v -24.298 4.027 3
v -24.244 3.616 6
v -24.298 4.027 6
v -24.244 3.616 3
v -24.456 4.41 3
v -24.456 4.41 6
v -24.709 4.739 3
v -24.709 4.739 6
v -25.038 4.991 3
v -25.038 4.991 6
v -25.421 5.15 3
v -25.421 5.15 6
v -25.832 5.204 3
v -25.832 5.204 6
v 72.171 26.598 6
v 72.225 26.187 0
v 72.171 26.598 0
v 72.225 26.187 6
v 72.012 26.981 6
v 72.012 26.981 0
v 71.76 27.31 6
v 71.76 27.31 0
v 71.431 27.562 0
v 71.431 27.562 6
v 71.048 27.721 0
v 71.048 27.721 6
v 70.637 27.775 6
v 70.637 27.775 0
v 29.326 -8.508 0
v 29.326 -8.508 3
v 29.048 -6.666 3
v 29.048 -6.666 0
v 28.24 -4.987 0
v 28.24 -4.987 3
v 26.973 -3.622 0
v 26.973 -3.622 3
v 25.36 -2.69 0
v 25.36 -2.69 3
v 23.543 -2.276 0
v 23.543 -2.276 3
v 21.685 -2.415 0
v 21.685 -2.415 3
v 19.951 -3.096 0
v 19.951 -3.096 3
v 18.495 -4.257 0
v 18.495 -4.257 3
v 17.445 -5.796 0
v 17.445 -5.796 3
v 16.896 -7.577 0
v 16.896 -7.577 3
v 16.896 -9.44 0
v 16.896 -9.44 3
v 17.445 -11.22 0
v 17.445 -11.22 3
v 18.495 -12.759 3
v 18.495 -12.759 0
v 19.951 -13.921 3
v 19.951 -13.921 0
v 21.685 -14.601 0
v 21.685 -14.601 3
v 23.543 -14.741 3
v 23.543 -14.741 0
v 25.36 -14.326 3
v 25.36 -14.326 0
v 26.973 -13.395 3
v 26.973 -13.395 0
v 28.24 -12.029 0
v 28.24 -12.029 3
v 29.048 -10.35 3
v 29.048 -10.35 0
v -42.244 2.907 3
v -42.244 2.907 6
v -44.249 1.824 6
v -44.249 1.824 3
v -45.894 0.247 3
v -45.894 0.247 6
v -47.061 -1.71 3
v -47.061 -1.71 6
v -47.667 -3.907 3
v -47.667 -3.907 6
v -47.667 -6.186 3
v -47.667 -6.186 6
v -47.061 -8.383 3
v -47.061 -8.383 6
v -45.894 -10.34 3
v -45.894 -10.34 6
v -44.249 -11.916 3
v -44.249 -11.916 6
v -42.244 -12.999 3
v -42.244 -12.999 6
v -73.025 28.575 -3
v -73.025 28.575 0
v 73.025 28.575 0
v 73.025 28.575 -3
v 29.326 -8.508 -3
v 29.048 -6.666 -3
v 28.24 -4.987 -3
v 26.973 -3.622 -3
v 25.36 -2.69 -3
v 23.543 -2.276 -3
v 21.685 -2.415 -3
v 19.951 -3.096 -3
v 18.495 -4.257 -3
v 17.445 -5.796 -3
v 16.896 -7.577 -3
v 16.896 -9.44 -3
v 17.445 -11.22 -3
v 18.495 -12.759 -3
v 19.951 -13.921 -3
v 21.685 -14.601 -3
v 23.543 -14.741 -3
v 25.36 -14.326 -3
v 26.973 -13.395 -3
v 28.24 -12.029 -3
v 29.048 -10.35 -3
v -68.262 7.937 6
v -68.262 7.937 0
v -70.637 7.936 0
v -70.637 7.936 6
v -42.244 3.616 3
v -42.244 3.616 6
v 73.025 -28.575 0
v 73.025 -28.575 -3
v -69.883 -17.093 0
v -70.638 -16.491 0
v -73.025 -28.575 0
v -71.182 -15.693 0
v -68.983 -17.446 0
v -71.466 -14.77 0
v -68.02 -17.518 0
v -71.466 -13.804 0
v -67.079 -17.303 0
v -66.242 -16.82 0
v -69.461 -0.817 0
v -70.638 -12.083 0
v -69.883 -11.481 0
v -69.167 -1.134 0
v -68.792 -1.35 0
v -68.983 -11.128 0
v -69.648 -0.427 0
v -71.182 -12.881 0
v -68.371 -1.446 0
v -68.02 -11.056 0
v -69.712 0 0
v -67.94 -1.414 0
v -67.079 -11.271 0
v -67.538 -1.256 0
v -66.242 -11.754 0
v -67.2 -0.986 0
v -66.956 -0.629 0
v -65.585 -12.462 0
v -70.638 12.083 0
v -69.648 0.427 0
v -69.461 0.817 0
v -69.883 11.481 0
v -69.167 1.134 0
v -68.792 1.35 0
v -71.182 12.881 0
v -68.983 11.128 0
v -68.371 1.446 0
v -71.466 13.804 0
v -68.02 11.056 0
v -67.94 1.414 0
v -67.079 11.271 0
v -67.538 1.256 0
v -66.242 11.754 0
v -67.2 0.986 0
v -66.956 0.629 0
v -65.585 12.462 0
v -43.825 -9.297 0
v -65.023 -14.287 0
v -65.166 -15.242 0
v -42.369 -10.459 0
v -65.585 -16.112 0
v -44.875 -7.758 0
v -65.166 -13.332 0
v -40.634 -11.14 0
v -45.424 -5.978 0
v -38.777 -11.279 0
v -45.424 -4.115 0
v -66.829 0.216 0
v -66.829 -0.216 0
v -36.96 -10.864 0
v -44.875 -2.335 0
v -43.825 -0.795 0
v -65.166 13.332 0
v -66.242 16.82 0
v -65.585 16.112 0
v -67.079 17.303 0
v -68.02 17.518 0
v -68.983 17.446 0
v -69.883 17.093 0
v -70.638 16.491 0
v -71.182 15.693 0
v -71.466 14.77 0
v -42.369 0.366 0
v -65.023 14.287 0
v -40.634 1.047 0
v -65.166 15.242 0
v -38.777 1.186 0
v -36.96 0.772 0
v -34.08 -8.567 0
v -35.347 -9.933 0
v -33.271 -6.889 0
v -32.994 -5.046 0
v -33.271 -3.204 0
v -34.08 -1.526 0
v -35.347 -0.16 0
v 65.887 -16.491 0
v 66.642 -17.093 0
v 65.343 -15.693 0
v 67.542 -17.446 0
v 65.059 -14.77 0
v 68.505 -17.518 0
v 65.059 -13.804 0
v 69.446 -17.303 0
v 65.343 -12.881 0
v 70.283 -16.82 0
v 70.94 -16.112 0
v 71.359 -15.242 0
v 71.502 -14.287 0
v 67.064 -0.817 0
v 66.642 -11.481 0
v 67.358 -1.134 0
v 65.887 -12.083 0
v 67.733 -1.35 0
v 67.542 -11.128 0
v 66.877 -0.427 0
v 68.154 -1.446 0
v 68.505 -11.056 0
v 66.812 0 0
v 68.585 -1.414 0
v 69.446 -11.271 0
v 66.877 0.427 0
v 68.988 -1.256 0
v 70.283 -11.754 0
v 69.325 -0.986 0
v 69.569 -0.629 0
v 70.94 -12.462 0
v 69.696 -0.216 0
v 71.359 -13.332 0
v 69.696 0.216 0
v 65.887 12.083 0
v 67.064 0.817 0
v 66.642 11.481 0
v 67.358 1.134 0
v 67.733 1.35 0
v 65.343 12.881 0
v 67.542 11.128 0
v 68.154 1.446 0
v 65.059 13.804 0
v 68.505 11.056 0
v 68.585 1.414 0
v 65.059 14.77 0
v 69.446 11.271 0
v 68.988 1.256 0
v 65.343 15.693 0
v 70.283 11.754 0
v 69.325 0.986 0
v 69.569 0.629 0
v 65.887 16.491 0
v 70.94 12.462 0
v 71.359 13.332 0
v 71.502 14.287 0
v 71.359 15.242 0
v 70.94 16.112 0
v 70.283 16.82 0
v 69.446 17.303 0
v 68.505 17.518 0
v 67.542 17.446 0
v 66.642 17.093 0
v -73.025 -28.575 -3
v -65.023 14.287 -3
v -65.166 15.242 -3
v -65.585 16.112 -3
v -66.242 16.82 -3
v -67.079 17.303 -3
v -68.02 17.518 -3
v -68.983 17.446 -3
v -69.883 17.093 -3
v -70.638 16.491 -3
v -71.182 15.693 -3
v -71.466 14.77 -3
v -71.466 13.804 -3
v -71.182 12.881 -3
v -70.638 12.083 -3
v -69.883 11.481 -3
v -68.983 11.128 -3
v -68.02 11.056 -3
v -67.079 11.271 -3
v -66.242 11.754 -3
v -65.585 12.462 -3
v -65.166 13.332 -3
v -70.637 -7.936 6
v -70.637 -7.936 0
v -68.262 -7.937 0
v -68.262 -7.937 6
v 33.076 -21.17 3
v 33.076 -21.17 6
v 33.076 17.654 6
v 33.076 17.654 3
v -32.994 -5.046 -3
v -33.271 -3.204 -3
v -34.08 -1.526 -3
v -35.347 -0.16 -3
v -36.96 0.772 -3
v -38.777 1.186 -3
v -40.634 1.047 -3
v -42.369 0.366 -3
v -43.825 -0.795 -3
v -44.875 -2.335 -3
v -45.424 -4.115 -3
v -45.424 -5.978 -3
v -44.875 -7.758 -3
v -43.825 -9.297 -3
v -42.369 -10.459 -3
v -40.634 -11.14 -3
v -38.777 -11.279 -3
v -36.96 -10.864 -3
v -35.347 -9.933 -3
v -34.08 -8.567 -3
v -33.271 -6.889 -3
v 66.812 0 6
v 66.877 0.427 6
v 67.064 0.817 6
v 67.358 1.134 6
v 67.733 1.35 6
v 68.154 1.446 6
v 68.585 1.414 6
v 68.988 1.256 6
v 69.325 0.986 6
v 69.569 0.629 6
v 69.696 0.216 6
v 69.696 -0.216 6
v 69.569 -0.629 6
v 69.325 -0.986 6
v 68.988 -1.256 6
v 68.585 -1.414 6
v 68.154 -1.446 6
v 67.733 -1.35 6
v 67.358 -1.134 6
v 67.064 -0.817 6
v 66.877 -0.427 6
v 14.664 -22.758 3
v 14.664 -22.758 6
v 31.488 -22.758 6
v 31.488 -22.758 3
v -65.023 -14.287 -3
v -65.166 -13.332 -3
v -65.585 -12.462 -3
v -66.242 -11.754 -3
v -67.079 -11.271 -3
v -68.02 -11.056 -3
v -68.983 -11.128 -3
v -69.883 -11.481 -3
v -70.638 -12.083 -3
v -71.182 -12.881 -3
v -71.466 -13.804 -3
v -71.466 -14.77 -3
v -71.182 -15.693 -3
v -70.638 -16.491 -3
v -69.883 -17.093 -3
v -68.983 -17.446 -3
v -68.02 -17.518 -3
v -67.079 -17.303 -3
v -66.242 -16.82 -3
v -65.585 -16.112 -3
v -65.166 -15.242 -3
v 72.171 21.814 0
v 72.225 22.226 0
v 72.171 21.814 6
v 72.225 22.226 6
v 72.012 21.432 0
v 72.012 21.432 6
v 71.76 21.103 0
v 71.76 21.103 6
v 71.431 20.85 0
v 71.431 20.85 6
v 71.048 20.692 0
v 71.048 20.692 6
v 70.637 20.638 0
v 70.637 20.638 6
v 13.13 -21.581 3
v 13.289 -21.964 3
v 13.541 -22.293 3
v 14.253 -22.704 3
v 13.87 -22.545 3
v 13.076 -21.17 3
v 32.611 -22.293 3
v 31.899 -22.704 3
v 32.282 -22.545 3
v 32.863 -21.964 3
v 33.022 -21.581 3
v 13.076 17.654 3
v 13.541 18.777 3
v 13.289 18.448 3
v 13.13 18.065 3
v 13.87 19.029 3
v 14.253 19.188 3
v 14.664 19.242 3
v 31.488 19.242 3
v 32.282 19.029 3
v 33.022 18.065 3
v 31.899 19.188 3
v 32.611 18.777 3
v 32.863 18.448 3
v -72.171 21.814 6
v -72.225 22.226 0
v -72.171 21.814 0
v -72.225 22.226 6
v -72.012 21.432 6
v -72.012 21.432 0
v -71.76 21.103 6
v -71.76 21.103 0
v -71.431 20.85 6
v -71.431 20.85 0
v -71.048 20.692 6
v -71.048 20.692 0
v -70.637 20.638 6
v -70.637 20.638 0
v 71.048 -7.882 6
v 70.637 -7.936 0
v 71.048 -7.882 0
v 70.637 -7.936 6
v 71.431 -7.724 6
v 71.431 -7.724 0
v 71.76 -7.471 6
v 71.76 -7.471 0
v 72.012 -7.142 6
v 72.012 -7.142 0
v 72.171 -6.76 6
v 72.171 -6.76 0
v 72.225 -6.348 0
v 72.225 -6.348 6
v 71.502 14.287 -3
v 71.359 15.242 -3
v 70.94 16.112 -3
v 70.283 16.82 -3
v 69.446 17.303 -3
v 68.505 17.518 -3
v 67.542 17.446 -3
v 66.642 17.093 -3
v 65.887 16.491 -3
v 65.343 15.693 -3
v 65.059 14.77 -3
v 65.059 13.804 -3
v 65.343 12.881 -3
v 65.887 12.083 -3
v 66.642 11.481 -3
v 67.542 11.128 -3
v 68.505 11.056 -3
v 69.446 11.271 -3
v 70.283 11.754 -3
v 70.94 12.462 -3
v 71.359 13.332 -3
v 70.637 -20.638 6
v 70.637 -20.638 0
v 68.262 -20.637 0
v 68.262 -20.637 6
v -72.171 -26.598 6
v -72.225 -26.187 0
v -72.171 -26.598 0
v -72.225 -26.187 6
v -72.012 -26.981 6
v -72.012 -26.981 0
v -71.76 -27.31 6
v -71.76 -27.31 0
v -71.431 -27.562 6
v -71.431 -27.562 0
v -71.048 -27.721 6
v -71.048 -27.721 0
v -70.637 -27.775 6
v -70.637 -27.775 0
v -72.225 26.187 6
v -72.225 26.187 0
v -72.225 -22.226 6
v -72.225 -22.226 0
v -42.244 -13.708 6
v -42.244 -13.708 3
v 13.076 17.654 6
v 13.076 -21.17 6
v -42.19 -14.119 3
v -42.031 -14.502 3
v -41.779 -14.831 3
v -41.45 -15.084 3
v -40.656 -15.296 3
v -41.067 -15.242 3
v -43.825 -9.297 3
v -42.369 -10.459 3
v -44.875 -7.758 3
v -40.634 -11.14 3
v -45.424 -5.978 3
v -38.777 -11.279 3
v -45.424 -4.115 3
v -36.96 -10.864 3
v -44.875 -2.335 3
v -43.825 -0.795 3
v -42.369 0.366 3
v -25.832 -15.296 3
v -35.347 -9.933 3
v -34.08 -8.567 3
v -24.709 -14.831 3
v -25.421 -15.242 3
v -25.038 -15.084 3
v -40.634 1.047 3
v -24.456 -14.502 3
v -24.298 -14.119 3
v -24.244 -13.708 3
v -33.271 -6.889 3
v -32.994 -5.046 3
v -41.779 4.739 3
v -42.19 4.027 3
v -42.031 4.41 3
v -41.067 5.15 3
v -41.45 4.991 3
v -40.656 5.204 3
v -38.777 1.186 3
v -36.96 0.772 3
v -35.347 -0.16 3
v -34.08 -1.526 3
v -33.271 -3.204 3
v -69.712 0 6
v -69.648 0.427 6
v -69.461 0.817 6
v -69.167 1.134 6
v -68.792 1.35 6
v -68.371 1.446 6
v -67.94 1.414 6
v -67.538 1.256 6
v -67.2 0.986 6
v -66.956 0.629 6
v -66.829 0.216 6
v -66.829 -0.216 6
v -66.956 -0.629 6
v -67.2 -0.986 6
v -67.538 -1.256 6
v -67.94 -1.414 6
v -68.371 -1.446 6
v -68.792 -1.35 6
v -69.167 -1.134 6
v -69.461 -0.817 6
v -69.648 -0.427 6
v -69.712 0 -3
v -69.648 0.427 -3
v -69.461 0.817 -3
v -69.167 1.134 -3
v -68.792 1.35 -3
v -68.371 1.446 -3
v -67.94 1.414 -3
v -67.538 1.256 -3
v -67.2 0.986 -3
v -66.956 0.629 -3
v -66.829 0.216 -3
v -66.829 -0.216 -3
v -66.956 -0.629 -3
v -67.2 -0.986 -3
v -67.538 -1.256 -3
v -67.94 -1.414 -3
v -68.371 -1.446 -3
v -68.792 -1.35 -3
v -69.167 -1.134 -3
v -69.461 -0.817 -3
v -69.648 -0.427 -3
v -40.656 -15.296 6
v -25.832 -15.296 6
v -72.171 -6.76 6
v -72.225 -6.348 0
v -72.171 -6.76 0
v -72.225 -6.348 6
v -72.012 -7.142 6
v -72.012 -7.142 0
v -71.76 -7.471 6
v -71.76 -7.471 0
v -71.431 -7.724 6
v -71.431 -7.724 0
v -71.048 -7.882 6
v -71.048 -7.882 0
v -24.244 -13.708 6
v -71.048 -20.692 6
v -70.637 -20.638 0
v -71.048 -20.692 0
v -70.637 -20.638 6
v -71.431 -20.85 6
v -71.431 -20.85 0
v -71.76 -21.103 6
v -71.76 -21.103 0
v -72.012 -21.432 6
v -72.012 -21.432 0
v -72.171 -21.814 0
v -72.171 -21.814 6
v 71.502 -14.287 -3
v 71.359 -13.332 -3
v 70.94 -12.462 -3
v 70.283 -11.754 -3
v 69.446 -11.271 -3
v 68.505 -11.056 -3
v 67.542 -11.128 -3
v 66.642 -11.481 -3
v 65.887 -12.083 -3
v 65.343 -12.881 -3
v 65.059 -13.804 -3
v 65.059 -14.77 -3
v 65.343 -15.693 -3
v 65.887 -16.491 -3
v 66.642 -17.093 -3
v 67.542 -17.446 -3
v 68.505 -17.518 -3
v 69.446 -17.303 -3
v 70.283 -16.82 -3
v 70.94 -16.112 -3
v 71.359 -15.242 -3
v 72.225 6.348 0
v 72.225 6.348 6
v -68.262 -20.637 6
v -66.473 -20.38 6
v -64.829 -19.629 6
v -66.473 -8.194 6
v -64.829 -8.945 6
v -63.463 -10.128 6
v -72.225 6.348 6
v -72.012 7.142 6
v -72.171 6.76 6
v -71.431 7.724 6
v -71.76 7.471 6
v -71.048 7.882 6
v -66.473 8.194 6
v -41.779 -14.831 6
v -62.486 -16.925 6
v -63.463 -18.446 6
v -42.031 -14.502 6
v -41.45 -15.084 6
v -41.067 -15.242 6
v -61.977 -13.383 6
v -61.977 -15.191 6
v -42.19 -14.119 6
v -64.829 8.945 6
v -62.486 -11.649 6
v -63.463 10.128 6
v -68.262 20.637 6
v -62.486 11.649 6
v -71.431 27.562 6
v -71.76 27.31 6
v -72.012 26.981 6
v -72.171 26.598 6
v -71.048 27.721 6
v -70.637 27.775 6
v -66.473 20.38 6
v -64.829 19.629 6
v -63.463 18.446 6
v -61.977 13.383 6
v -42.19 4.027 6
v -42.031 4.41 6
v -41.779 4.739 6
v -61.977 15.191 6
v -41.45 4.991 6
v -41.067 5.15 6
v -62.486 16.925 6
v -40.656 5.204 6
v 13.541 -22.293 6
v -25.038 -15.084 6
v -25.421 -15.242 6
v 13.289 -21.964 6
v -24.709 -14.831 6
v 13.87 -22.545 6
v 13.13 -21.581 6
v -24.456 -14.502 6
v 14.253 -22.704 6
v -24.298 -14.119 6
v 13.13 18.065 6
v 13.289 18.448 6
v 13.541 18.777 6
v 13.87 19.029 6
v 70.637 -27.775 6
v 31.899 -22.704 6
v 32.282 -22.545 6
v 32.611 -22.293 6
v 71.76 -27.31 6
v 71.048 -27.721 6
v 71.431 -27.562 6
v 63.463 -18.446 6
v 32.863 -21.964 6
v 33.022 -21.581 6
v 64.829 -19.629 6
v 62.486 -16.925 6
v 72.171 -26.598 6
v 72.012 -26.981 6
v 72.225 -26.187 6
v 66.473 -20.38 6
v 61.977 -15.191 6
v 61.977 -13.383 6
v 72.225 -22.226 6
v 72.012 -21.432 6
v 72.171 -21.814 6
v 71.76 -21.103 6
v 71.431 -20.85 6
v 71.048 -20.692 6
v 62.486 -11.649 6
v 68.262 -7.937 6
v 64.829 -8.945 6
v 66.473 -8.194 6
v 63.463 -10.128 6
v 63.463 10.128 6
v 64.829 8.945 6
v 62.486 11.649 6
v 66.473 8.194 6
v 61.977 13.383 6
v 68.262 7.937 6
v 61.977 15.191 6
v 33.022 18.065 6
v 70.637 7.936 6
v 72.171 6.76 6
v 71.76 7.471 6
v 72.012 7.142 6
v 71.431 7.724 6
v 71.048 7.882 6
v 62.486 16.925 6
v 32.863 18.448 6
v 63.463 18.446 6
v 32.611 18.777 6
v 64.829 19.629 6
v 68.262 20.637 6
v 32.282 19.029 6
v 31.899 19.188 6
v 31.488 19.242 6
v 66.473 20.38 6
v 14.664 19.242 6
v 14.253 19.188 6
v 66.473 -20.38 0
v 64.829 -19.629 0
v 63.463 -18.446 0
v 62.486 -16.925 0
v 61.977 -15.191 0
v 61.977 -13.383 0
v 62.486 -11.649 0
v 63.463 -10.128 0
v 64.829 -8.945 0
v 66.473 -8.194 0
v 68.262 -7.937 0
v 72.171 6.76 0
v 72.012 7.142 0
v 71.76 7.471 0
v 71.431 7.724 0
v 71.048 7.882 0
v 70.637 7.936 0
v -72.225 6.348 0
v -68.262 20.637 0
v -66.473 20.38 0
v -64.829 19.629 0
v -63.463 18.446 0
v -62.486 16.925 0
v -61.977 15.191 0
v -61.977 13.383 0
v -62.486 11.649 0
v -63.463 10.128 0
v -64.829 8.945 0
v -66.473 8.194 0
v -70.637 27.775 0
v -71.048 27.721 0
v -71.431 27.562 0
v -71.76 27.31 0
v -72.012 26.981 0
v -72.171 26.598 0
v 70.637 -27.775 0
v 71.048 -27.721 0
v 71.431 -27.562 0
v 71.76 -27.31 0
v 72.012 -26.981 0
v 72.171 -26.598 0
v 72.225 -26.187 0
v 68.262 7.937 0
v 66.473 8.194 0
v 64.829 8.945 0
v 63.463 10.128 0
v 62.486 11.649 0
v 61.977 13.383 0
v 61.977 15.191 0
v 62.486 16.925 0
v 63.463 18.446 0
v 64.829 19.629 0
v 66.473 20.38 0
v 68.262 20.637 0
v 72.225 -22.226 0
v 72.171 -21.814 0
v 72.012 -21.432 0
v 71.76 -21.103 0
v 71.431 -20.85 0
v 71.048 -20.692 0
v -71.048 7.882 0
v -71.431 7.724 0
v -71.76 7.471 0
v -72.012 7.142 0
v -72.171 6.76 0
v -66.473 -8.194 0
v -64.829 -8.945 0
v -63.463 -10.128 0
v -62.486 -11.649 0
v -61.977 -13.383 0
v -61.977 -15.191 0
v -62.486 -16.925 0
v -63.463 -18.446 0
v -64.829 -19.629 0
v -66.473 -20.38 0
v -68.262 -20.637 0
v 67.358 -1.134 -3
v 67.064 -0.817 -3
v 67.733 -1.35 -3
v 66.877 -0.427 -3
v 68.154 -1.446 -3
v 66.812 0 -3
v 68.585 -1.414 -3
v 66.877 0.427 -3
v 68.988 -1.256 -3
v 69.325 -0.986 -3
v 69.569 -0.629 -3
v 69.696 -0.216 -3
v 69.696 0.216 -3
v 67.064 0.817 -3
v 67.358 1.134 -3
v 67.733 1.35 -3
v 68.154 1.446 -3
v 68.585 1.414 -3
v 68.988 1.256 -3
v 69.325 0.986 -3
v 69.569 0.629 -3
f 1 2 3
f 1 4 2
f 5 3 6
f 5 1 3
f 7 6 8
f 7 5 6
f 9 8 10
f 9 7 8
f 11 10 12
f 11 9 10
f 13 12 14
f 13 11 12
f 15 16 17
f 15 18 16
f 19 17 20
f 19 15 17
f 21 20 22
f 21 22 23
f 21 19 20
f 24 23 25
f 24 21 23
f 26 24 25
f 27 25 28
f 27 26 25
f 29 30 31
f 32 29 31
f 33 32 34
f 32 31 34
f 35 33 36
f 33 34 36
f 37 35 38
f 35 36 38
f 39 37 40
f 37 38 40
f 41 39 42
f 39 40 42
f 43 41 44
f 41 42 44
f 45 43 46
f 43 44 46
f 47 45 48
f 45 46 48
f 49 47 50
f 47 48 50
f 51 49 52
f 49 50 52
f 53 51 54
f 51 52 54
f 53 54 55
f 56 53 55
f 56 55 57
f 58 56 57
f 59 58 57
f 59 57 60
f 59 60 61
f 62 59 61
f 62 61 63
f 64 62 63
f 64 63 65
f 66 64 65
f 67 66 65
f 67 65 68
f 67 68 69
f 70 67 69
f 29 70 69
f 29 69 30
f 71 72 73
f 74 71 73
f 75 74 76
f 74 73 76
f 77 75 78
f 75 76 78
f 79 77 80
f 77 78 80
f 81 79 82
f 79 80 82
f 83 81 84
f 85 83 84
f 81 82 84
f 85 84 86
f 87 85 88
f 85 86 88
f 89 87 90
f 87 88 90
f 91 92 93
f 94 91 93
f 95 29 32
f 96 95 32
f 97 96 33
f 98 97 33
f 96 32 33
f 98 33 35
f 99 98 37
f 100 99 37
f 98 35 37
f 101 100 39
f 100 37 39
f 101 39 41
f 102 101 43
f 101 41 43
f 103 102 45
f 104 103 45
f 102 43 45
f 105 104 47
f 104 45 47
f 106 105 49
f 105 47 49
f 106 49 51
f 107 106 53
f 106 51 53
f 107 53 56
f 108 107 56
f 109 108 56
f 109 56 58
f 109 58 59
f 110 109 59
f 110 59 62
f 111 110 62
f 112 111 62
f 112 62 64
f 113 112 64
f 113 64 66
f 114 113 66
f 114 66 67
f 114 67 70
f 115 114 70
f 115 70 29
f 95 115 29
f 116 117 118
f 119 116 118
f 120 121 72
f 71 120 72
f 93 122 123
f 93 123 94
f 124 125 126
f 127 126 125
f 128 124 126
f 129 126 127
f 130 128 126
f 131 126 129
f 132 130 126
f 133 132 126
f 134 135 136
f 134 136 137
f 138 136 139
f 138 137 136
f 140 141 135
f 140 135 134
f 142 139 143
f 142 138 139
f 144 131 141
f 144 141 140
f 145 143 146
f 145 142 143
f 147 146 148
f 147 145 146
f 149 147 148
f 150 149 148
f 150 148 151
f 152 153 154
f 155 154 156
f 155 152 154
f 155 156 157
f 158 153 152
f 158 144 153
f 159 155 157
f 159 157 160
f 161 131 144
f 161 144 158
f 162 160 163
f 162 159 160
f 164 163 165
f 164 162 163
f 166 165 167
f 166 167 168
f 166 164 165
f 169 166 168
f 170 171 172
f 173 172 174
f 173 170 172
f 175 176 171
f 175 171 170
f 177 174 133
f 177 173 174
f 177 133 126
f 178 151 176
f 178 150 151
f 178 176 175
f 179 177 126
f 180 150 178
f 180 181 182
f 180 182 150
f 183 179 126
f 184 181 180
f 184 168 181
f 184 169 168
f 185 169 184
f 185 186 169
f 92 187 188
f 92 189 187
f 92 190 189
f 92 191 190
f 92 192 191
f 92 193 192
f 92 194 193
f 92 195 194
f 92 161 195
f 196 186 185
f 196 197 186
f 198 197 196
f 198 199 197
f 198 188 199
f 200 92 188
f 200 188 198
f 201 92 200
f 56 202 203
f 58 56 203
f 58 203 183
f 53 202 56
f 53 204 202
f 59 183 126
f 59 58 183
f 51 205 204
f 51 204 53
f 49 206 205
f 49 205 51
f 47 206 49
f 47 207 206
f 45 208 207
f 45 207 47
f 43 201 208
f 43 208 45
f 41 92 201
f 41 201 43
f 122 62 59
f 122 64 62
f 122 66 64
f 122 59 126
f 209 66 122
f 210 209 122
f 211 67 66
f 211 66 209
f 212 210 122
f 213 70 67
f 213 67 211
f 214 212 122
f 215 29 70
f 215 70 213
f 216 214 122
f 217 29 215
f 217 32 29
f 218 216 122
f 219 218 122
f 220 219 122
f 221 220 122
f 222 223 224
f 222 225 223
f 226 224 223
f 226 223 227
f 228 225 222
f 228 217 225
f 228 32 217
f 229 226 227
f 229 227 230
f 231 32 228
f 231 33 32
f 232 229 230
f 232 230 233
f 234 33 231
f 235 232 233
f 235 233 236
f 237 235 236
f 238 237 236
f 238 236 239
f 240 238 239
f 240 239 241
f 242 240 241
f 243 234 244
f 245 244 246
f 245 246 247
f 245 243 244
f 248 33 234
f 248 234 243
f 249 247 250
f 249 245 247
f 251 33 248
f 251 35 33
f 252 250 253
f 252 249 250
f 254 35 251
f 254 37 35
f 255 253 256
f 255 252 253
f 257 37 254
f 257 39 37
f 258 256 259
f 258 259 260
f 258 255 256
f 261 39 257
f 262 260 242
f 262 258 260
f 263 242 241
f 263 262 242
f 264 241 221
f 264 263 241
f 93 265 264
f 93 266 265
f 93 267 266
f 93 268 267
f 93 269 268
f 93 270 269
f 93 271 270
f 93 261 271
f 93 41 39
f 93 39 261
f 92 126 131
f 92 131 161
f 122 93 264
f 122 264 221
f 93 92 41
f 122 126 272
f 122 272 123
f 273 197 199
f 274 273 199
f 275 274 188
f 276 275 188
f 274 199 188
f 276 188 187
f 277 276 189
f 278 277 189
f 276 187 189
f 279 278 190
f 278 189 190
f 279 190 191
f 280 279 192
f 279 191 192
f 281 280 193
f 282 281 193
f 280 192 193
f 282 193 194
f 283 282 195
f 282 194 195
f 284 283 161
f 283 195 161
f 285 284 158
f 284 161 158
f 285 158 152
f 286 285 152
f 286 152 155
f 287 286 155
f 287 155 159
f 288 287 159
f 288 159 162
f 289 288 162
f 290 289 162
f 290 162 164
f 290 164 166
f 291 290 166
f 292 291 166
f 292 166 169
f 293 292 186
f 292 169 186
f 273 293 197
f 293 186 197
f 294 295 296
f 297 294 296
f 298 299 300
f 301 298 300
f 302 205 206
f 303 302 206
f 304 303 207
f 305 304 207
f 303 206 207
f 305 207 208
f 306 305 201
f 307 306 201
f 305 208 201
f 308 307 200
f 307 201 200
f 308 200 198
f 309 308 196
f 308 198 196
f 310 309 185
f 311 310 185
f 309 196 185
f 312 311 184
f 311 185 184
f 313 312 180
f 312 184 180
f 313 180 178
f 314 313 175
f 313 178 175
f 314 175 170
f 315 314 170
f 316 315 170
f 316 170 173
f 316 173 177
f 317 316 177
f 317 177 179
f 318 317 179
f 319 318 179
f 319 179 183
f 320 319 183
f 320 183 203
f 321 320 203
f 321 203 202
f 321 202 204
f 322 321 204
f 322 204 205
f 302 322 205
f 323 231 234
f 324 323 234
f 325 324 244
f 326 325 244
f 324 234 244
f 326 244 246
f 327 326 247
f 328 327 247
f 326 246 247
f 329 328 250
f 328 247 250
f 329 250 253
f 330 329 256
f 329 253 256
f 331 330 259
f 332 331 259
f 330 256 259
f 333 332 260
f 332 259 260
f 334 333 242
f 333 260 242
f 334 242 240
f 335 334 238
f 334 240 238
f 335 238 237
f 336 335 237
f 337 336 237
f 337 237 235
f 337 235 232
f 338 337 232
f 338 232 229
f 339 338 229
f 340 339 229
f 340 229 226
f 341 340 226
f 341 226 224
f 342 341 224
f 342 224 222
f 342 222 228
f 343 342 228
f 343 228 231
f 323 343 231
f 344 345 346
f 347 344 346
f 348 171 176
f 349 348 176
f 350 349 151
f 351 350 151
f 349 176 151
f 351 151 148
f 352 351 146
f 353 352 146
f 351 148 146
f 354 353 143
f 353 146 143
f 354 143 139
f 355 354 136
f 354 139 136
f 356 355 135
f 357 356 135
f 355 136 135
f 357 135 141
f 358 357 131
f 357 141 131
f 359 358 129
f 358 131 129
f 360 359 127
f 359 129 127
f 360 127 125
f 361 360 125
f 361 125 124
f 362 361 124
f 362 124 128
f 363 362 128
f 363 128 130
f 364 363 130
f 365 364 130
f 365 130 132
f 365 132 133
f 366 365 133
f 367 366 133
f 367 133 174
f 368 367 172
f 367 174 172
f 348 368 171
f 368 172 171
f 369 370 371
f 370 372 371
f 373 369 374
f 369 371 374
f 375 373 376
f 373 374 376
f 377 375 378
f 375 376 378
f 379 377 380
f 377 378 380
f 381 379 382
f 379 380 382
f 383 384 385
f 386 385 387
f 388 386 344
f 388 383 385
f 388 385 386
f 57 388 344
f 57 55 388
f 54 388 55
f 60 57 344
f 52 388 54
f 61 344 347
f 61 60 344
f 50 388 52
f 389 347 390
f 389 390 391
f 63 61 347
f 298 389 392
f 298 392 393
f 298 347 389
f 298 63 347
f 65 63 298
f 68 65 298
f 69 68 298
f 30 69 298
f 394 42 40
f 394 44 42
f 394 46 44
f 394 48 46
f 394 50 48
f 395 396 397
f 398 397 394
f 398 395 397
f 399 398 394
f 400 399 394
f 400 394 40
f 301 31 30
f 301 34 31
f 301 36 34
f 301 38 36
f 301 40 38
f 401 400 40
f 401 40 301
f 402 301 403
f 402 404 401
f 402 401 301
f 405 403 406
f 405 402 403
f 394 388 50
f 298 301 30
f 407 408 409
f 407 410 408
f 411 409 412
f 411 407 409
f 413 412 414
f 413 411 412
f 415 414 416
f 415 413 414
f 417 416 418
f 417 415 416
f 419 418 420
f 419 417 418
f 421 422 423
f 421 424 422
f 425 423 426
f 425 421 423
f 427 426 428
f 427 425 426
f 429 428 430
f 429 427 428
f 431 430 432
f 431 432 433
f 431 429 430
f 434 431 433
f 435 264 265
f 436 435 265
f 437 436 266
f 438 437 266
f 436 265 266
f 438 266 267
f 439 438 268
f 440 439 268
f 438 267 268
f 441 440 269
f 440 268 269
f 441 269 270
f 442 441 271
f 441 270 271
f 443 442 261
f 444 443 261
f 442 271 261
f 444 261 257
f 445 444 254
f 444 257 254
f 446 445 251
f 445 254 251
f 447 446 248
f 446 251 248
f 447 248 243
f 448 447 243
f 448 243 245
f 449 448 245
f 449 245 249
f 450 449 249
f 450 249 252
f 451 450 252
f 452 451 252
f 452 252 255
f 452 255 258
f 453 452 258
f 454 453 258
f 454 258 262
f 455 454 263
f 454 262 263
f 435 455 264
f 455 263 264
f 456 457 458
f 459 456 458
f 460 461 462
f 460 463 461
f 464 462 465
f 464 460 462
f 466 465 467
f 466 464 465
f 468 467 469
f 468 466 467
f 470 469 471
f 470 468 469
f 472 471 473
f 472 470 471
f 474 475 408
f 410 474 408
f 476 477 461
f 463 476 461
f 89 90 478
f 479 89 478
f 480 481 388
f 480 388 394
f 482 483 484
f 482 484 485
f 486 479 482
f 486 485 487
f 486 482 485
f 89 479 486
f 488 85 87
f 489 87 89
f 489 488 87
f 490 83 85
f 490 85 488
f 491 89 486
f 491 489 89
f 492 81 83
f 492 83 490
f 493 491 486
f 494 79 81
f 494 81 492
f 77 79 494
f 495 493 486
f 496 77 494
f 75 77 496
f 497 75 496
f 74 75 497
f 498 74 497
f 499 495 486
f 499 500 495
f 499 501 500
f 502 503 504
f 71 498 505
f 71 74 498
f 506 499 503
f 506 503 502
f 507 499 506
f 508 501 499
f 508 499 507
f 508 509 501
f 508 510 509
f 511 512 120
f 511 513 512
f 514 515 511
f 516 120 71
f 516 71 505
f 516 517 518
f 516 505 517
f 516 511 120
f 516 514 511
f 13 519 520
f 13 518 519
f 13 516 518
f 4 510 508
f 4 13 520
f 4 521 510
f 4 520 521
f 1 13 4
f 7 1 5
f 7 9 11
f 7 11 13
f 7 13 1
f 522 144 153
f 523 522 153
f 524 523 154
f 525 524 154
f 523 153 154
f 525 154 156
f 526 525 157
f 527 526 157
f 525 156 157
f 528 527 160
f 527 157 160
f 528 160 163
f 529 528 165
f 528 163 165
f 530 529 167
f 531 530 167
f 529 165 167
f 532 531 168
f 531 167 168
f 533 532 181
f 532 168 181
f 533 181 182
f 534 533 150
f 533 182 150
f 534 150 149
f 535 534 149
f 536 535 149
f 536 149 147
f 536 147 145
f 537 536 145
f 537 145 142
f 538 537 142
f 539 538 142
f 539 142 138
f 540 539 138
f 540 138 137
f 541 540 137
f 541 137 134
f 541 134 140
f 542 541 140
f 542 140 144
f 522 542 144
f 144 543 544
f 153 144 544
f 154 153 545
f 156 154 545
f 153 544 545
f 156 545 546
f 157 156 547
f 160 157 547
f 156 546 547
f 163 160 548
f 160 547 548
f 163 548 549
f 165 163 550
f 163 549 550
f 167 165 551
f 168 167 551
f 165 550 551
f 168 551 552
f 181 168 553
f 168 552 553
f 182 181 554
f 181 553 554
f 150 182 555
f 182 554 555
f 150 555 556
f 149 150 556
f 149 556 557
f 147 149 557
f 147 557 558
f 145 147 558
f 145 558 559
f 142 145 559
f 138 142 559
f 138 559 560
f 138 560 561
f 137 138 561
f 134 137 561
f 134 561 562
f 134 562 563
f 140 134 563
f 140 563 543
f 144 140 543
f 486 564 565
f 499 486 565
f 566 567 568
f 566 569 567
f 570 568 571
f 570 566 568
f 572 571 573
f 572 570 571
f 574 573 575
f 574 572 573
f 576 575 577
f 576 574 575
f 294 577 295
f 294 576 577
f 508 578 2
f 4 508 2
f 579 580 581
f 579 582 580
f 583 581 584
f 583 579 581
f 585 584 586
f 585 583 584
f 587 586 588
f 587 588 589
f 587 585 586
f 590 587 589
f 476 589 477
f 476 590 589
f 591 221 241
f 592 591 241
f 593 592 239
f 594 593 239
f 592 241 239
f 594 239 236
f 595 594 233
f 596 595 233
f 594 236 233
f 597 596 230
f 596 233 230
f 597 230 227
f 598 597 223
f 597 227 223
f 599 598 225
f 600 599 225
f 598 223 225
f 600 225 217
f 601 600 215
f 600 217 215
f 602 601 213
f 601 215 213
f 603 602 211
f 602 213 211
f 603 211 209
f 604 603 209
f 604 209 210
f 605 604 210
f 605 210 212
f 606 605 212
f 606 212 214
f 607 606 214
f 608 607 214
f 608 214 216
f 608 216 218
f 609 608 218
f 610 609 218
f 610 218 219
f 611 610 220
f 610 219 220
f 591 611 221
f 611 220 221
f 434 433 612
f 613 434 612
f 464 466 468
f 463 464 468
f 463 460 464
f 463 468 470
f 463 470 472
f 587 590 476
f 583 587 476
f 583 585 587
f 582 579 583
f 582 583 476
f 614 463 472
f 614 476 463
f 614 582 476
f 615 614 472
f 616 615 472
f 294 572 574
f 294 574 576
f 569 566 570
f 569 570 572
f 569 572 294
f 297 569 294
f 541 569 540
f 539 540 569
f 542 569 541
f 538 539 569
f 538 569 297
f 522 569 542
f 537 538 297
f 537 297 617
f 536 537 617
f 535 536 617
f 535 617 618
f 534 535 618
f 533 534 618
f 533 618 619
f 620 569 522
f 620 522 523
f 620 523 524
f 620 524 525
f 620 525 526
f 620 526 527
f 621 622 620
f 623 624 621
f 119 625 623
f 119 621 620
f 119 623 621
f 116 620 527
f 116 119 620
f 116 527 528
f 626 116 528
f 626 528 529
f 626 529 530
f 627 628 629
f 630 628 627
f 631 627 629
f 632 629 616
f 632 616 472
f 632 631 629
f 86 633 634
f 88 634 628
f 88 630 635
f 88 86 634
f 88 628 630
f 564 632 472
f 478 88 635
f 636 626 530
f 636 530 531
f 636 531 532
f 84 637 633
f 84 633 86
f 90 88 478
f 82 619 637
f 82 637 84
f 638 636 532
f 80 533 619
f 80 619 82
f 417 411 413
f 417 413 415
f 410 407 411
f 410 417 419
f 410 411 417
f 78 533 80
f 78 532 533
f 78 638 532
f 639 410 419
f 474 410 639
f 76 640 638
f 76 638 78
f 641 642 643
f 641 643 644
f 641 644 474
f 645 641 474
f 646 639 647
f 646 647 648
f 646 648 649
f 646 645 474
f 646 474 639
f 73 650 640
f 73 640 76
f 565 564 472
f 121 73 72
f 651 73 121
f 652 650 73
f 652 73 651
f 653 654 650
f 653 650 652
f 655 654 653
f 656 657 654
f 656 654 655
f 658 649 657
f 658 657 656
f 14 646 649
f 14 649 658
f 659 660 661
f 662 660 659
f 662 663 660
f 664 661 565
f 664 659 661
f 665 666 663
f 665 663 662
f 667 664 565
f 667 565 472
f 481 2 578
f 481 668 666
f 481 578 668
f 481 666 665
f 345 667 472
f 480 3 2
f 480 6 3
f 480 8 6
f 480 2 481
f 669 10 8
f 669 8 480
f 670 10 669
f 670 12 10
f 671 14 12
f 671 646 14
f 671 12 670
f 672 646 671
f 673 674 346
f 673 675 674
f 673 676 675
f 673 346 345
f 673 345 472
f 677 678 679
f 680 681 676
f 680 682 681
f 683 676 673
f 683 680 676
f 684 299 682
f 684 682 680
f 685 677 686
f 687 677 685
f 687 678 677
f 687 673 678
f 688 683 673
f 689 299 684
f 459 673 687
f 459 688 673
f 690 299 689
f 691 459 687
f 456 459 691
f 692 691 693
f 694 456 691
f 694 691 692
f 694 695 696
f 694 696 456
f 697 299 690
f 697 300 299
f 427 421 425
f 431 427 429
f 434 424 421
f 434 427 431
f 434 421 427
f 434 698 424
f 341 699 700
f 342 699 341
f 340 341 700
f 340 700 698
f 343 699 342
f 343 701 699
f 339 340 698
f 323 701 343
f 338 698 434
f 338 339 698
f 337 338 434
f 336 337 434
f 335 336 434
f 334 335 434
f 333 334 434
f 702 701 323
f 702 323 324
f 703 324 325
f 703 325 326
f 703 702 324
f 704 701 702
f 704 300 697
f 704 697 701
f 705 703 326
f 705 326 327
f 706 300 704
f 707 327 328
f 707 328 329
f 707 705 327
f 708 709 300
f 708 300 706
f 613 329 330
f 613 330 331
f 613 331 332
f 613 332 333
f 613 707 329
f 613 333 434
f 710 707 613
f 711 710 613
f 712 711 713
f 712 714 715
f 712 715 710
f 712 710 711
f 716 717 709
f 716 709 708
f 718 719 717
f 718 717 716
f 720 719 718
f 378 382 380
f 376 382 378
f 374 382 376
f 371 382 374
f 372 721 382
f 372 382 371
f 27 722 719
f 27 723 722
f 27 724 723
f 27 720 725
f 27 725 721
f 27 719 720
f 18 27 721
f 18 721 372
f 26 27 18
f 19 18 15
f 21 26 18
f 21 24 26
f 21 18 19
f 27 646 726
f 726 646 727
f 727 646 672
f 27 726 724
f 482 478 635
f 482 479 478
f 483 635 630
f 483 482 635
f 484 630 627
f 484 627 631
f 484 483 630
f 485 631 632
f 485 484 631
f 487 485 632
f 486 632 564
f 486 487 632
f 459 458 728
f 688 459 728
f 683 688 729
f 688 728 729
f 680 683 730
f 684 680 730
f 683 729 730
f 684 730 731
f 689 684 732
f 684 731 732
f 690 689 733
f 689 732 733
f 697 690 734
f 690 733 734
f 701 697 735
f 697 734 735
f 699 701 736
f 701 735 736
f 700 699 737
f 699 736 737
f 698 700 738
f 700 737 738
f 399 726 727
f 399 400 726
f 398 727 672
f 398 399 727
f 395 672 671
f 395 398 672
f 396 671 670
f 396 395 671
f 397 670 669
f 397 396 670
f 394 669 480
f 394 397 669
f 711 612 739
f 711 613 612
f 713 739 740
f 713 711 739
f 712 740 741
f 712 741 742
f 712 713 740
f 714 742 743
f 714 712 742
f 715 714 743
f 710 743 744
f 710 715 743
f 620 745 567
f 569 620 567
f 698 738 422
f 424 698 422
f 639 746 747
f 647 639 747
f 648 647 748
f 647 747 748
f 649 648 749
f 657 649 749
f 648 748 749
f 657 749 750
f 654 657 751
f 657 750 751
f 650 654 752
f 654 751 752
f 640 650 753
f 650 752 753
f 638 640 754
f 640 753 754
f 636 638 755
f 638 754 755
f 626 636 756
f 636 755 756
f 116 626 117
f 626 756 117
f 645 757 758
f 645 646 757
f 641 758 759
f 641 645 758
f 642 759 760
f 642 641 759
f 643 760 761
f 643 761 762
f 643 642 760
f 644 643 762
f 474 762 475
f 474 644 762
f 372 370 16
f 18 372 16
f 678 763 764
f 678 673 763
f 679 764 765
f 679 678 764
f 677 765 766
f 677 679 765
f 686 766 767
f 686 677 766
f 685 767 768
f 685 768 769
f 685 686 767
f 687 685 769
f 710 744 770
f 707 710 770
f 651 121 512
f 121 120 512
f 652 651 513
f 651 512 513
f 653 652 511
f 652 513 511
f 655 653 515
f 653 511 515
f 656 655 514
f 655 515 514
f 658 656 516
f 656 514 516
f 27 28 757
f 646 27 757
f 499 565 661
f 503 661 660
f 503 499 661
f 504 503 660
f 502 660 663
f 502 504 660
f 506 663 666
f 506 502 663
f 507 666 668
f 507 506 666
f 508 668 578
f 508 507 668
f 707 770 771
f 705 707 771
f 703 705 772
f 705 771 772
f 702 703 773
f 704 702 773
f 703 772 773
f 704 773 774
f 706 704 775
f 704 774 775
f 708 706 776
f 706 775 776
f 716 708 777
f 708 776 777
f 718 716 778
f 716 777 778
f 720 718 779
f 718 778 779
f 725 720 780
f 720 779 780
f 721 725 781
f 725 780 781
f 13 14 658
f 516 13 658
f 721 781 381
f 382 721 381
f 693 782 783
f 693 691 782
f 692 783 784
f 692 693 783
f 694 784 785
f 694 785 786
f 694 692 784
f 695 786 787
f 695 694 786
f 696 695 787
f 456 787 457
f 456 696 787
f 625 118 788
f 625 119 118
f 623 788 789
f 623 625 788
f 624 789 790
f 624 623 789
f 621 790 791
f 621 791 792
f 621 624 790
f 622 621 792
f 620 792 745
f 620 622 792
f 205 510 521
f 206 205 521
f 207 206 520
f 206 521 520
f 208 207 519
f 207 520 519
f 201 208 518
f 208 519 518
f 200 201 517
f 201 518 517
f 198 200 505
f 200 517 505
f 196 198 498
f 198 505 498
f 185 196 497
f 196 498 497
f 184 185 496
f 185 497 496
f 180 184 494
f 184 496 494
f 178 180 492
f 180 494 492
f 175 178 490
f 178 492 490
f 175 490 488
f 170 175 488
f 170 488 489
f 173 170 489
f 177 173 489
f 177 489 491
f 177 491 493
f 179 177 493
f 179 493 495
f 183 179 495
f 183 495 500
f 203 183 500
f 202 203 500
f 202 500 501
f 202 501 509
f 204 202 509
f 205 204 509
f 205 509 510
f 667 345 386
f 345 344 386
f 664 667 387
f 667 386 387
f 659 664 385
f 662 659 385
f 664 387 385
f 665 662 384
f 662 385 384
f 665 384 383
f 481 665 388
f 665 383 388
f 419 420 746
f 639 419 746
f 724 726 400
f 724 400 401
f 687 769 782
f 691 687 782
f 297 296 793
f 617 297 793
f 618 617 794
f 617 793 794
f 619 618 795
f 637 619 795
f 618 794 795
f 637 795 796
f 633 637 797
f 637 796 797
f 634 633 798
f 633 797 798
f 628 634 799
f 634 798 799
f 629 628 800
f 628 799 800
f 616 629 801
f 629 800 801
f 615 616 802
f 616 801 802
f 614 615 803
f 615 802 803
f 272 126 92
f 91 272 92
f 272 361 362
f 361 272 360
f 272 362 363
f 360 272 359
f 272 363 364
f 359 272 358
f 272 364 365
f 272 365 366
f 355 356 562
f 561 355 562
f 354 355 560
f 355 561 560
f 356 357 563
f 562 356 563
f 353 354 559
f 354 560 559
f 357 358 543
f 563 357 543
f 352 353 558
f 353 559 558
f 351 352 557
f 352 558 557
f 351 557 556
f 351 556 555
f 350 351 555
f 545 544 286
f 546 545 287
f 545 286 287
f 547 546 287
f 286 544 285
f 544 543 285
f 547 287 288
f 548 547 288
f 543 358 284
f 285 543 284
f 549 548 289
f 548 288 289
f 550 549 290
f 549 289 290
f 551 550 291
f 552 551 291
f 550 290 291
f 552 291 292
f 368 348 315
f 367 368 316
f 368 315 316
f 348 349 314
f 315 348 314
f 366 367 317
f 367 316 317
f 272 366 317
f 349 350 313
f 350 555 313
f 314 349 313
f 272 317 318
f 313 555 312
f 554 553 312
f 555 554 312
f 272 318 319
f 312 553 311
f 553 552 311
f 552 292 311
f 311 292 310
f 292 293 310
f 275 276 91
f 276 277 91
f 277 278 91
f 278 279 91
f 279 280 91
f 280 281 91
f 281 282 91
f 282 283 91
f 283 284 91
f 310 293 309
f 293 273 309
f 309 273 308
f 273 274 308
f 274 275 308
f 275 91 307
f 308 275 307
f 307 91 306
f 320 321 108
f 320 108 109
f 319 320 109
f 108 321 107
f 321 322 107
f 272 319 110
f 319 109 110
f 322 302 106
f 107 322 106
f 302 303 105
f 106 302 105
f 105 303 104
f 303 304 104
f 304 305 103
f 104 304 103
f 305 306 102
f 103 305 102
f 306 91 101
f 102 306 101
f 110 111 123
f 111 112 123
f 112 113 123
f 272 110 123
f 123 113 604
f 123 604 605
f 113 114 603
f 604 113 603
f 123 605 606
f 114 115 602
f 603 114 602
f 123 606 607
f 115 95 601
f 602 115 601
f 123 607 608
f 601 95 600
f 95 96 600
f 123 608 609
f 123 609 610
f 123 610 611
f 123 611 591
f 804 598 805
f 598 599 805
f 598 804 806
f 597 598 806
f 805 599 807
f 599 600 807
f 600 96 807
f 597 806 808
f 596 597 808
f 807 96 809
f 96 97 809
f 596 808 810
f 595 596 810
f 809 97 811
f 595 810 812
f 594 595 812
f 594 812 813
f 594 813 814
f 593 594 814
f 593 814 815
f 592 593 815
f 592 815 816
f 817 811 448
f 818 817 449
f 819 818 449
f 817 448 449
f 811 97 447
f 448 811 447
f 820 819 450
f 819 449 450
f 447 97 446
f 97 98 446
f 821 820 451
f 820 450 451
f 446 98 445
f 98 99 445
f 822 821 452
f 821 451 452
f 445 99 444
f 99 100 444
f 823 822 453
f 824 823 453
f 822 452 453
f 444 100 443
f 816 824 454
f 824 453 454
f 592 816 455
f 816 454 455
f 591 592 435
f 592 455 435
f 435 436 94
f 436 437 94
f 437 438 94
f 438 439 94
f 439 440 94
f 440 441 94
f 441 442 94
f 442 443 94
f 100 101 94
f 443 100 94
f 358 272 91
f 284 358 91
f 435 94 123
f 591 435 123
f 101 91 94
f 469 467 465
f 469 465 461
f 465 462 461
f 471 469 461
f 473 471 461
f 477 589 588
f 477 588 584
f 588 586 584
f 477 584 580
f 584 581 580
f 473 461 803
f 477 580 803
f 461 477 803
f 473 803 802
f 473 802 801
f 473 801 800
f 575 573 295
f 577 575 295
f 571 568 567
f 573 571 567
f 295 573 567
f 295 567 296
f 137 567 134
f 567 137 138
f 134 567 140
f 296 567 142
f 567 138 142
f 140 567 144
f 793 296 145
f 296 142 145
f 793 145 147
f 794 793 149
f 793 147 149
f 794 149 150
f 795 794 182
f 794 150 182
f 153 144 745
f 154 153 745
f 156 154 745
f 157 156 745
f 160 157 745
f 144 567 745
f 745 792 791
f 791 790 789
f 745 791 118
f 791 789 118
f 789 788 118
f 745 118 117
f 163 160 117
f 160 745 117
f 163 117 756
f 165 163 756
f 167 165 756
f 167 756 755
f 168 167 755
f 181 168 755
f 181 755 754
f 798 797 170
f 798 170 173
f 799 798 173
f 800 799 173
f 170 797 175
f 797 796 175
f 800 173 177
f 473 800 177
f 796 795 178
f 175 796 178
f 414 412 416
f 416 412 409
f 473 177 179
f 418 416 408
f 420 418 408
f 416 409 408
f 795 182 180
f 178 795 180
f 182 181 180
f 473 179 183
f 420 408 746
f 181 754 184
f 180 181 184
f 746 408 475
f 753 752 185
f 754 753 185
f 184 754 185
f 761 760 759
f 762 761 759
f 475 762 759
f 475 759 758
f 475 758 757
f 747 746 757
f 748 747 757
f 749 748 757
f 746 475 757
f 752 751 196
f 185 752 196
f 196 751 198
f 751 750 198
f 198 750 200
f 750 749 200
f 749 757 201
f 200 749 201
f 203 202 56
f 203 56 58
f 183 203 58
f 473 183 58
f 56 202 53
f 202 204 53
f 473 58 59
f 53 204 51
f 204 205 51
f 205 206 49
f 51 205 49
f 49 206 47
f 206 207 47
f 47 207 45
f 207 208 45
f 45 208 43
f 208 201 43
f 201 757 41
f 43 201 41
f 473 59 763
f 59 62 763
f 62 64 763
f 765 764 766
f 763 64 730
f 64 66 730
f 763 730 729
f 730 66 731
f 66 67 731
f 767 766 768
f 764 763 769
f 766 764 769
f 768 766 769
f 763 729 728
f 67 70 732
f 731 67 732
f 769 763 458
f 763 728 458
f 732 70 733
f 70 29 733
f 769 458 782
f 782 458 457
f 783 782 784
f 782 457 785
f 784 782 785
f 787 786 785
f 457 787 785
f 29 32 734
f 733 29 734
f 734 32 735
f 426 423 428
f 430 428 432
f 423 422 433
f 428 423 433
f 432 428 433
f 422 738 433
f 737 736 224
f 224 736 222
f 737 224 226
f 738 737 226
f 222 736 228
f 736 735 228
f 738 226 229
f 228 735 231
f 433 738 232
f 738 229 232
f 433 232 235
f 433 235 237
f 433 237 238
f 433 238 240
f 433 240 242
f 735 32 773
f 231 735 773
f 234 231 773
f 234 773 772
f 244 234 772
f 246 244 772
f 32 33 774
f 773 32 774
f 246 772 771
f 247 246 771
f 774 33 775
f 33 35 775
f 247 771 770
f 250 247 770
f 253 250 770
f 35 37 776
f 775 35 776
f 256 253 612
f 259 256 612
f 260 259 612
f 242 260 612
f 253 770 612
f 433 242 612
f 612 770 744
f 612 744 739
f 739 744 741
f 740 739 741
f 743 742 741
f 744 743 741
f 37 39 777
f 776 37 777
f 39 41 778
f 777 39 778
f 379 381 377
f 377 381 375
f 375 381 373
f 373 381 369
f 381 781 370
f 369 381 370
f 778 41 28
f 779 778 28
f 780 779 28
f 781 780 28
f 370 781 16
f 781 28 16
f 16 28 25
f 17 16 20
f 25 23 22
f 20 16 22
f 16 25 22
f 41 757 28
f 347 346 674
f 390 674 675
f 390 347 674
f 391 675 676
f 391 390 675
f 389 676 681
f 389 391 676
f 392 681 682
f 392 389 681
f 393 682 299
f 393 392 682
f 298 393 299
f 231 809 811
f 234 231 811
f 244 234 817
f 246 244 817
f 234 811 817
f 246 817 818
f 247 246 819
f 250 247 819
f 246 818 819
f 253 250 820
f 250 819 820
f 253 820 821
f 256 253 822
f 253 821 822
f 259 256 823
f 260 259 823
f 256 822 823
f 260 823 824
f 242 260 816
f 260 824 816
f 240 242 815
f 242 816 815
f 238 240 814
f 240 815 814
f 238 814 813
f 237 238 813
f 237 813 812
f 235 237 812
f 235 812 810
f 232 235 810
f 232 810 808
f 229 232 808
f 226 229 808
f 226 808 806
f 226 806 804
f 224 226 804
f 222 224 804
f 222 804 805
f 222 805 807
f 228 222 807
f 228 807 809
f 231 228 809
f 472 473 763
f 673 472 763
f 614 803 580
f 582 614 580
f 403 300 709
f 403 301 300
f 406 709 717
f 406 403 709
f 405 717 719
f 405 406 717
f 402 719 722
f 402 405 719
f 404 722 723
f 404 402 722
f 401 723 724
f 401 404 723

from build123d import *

# Parameters (mm, degrees)
F0_W        = 146.05
F0_H        = 57.15
F0_R        = 3.24
F1_DEPTH    = 3
F2_DEPTH    = 6
F3_R        = 1.588
F5_W        = 20
F5_H        = 42
F5_R        = 6.25
F6_DEPTH    = 3
F7_DEPTH    = 25
F8_R        = 1.588
F10_D       = 2.9
F10_DEPTH   = 10
F10_TIP     = 0.8712478976
F10_2_D     = 2.9
F10_2_DEPTH = 10
F10_2_TIP   = 0.8712478976


with BuildPart() as f1:
    # F0 (on Top) → F1 (new body)
    with BuildSketch(Plane.XY):
        Rectangle(F0_W, F0_H)
        with Locations((-68.2625, -14.287)):
            Circle(F0_R, mode=Mode.SUBTRACT)
        with Locations((68.2625, -14.287)):
            Circle(F0_R, mode=Mode.SUBTRACT)
        with Locations((-68.2625, 14.287)):
            Circle(F0_R, mode=Mode.SUBTRACT)
        with BuildLine():
            Line((-72.225, 27.775), (72.225, 27.775))
            Line((72.225, 27.775), (72.225, 20.6375))
            Line((72.225, 20.6375), (68.2625, 20.6375))
            ThreePointArc((68.2625, 20.6375), (61.912, 14.287), (68.2625, 7.9365))
            Line((68.2625, 7.9365), (72.225, 7.9365))
            Line((72.225, 7.9365), (72.225, -7.9365))
            Line((72.225, -7.9365), (68.2625, -7.9365))
            ThreePointArc((68.2625, -7.9365), (61.912, -14.287), (68.2625, -20.6375))
            Line((68.2625, -20.6375), (72.225, -20.6375))
            Line((72.225, -20.6375), (72.225, -27.775))
            Line((72.225, -27.775), (-72.225, -27.775))
            Line((-72.225, -27.775), (-72.225, -20.6375))
            Line((-72.225, -20.6375), (-68.2625, -20.6375))
            ThreePointArc((-68.2625, -20.6375), (-61.912, -14.287), (-68.2625, -7.9365))
            Line((-68.2625, -7.9365), (-72.225, -7.9365))
            Line((-72.225, -7.9365), (-72.225, 7.9365))
            Line((-72.225, 7.9365), (-68.2625, 7.9365))
            ThreePointArc((-68.2625, 7.9365), (-61.912, 14.287), (-68.2625, 20.6375))
            Line((-68.2625, 20.6375), (-72.225, 20.6375))
            Line((-72.225, 20.6375), (-72.225, 27.775))
        make_face(mode=Mode.SUBTRACT)
        with Locations((68.2625, 14.287)):
            Circle(F0_R, mode=Mode.SUBTRACT)
        with BuildLine():
            Line((72.225, 20.6375), (72.225, 27.775))
            Line((72.225, 27.775), (-72.225, 27.775))
            Line((-72.225, 27.775), (-72.225, 20.6375))
            Line((-72.225, 20.6375), (-68.2625, 20.6375))
            ThreePointArc((-68.2625, 20.6375), (-61.912, 14.287), (-68.2625, 7.9365))
            Line((-68.2625, 7.9365), (-72.225, 7.9365))
            Line((-72.225, 7.9365), (-72.225, -7.9365))
            Line((-72.225, -7.9365), (-68.2625, -7.9365))
            ThreePointArc((-68.2625, -7.9365), (-61.912, -14.287), (-68.2625, -20.6375))
            Line((-68.2625, -20.6375), (-72.225, -20.6375))
            Line((-72.225, -20.6375), (-72.225, -27.775))
            Line((-72.225, -27.775), (72.225, -27.775))
            Line((72.225, -27.775), (72.225, -20.6375))
            Line((72.225, -20.6375), (68.2625, -20.6375))
            ThreePointArc((68.2625, -20.6375), (61.912, -14.287), (68.2625, -7.9365))
            Line((68.2625, -7.9365), (72.225, -7.9365))
            Line((72.225, -7.9365), (72.225, 7.9365))
            Line((72.225, 7.9365), (68.2625, 7.9365))
            ThreePointArc((68.2625, 7.9365), (61.912, 14.287), (68.2625, 20.6375))
            Line((68.2625, 20.6375), (72.225, 20.6375))
        make_face()
    extrude(amount=-F1_DEPTH)


with BuildPart() as f2:
    # F0 (on Top) → F2 (new body)
    with BuildSketch(Plane.XY):
        with BuildLine():
            Line((72.225, 20.6375), (72.225, 27.775))
            Line((72.225, 27.775), (-72.225, 27.775))
            Line((-72.225, 27.775), (-72.225, 20.6375))
            Line((-72.225, 20.6375), (-68.2625, 20.6375))
            ThreePointArc((-68.2625, 20.6375), (-61.912, 14.287), (-68.2625, 7.9365))
            Line((-68.2625, 7.9365), (-72.225, 7.9365))
            Line((-72.225, 7.9365), (-72.225, -7.9365))
            Line((-72.225, -7.9365), (-68.2625, -7.9365))
            ThreePointArc((-68.2625, -7.9365), (-61.912, -14.287), (-68.2625, -20.6375))
            Line((-68.2625, -20.6375), (-72.225, -20.6375))
            Line((-72.225, -20.6375), (-72.225, -27.775))
            Line((-72.225, -27.775), (72.225, -27.775))
            Line((72.225, -27.775), (72.225, -20.6375))
            Line((72.225, -20.6375), (68.2625, -20.6375))
            ThreePointArc((68.2625, -20.6375), (61.912, -14.287), (68.2625, -7.9365))
            Line((68.2625, -7.9365), (72.225, -7.9365))
            Line((72.225, -7.9365), (72.225, 7.9365))
            Line((72.225, 7.9365), (68.2625, 7.9365))
            ThreePointArc((68.2625, 7.9365), (61.912, 14.287), (68.2625, 20.6375))
            Line((68.2625, 20.6375), (72.225, 20.6375))
        make_face()
    extrude(amount=F2_DEPTH)

    # F3
    f3_edges = [f2.edges().sort_by_distance(p)[0] for p in [
        (-72.225, 27.775, 3),
        (-72.225, 20.6375, 3),
        (-72.225, 7.9365, 3),
        (-72.225, -7.9365, 3),
        (-72.225, -20.6375, 3),
        (-72.225, -27.775, 3),
        (72.225, 20.6375, 3),
        (72.225, -7.9365, 3),
        (72.225, -27.775, 3),
        (72.225, -20.6375, 3),
        (72.225, 7.9365, 3),
        (72.225, 27.775, 3),
    ]]
    fillet(f3_edges, radius=F3_R)

    # F5 (on face) → F6 (cut)
    with BuildSketch(Plane.XY.offset(6)):
        with Locations((23.0761349574, -1.7581597865)):
            Rectangle(F5_W, F5_H)
        with Locations((23.0761349574, -8.5081597865)):
            Circle(F5_R, mode=Mode.SUBTRACT)
        with BuildLine():
            Line((-42.2436161637, 5.2037057467), (-42.2436161637, 2.906692607))
            ThreePointArc((-42.2436161637, 2.906692607), (-47.7436161637, -5.0462942533), (-42.2436161637, -12.9992811136))
            Line((-42.2436161637, -12.9992811136), (-42.2436161637, -15.2962942533))
            Line((-42.2436161637, -15.2962942533), (-24.2436161637, -15.2962942533))
            Line((-24.2436161637, -15.2962942533), (-24.2436161637, 5.2037057467))
            Line((-24.2436161637, 5.2037057467), (-42.2436161637, 5.2037057467))
        make_face()
        with Locations((-39.2436161637, -5.0462942533)):
            Circle(F5_R, mode=Mode.SUBTRACT)
    extrude(amount=-F6_DEPTH, mode=Mode.SUBTRACT)


with BuildPart() as f7_tool:
    # F5 (on face) → F7 (new body)
    with BuildSketch(Plane.XY.offset(6)):
        with Locations((23.0761349574, -8.5081597865)):
            Circle(F5_R)
        with Locations((-39.2436161637, -5.0462942533)):
            Circle(F5_R)
    extrude(amount=-F7_DEPTH)


with BuildPart() as f1_1:
    add(f1.part)

    # F7: cut by f7_tool
    add(f7_tool.part, mode=Mode.SUBTRACT)

    # F10
    with Locations(Plane.XY.offset(6)):
        with Locations((-68.2625, 0), (68.2625, 0)):
            Hole(F10_D / 2, depth=F10_DEPTH)
            with Locations((0, 0, -(F10_DEPTH + F10_TIP / 2))):  # 118° drill point
                Cone(0, F10_D / 2, F10_TIP, mode=Mode.SUBTRACT)


with BuildPart() as f2_1:
    add(f2.part)

    # F7: cut by f7_tool
    add(f7_tool.part, mode=Mode.SUBTRACT)

    # F8
    f8_edges = [f2_1.edges().sort_by_distance(p)[0] for p in [
        (-42.243616, 5.203706, 4.5),
        (-24.243616, 5.203706, 4.5),
        (-24.243616, -15.296294, 4.5),
        (13.076135, 19.24184, 4.5),
        (33.076135, 19.24184, 4.5),
        (13.076135, -22.75816, 4.5),
        (33.076135, -22.75816, 4.5),
        (-42.243616, -15.296294, 4.5),
    ]]
    fillet(f8_edges, radius=F8_R)

    # F10#2
    with Locations(Plane.XY.offset(6)):
        with Locations((-68.2625, 0), (68.2625, 0)):
            Hole(F10_2_D / 2, depth=F10_2_DEPTH)
            with Locations((0, 0, -(F10_2_DEPTH + F10_2_TIP / 2))):  # 118° drill point
                Cone(0, F10_2_D / 2, F10_2_TIP, mode=Mode.SUBTRACT)


solid = Compound([f1_1.part, f2_1.part])
